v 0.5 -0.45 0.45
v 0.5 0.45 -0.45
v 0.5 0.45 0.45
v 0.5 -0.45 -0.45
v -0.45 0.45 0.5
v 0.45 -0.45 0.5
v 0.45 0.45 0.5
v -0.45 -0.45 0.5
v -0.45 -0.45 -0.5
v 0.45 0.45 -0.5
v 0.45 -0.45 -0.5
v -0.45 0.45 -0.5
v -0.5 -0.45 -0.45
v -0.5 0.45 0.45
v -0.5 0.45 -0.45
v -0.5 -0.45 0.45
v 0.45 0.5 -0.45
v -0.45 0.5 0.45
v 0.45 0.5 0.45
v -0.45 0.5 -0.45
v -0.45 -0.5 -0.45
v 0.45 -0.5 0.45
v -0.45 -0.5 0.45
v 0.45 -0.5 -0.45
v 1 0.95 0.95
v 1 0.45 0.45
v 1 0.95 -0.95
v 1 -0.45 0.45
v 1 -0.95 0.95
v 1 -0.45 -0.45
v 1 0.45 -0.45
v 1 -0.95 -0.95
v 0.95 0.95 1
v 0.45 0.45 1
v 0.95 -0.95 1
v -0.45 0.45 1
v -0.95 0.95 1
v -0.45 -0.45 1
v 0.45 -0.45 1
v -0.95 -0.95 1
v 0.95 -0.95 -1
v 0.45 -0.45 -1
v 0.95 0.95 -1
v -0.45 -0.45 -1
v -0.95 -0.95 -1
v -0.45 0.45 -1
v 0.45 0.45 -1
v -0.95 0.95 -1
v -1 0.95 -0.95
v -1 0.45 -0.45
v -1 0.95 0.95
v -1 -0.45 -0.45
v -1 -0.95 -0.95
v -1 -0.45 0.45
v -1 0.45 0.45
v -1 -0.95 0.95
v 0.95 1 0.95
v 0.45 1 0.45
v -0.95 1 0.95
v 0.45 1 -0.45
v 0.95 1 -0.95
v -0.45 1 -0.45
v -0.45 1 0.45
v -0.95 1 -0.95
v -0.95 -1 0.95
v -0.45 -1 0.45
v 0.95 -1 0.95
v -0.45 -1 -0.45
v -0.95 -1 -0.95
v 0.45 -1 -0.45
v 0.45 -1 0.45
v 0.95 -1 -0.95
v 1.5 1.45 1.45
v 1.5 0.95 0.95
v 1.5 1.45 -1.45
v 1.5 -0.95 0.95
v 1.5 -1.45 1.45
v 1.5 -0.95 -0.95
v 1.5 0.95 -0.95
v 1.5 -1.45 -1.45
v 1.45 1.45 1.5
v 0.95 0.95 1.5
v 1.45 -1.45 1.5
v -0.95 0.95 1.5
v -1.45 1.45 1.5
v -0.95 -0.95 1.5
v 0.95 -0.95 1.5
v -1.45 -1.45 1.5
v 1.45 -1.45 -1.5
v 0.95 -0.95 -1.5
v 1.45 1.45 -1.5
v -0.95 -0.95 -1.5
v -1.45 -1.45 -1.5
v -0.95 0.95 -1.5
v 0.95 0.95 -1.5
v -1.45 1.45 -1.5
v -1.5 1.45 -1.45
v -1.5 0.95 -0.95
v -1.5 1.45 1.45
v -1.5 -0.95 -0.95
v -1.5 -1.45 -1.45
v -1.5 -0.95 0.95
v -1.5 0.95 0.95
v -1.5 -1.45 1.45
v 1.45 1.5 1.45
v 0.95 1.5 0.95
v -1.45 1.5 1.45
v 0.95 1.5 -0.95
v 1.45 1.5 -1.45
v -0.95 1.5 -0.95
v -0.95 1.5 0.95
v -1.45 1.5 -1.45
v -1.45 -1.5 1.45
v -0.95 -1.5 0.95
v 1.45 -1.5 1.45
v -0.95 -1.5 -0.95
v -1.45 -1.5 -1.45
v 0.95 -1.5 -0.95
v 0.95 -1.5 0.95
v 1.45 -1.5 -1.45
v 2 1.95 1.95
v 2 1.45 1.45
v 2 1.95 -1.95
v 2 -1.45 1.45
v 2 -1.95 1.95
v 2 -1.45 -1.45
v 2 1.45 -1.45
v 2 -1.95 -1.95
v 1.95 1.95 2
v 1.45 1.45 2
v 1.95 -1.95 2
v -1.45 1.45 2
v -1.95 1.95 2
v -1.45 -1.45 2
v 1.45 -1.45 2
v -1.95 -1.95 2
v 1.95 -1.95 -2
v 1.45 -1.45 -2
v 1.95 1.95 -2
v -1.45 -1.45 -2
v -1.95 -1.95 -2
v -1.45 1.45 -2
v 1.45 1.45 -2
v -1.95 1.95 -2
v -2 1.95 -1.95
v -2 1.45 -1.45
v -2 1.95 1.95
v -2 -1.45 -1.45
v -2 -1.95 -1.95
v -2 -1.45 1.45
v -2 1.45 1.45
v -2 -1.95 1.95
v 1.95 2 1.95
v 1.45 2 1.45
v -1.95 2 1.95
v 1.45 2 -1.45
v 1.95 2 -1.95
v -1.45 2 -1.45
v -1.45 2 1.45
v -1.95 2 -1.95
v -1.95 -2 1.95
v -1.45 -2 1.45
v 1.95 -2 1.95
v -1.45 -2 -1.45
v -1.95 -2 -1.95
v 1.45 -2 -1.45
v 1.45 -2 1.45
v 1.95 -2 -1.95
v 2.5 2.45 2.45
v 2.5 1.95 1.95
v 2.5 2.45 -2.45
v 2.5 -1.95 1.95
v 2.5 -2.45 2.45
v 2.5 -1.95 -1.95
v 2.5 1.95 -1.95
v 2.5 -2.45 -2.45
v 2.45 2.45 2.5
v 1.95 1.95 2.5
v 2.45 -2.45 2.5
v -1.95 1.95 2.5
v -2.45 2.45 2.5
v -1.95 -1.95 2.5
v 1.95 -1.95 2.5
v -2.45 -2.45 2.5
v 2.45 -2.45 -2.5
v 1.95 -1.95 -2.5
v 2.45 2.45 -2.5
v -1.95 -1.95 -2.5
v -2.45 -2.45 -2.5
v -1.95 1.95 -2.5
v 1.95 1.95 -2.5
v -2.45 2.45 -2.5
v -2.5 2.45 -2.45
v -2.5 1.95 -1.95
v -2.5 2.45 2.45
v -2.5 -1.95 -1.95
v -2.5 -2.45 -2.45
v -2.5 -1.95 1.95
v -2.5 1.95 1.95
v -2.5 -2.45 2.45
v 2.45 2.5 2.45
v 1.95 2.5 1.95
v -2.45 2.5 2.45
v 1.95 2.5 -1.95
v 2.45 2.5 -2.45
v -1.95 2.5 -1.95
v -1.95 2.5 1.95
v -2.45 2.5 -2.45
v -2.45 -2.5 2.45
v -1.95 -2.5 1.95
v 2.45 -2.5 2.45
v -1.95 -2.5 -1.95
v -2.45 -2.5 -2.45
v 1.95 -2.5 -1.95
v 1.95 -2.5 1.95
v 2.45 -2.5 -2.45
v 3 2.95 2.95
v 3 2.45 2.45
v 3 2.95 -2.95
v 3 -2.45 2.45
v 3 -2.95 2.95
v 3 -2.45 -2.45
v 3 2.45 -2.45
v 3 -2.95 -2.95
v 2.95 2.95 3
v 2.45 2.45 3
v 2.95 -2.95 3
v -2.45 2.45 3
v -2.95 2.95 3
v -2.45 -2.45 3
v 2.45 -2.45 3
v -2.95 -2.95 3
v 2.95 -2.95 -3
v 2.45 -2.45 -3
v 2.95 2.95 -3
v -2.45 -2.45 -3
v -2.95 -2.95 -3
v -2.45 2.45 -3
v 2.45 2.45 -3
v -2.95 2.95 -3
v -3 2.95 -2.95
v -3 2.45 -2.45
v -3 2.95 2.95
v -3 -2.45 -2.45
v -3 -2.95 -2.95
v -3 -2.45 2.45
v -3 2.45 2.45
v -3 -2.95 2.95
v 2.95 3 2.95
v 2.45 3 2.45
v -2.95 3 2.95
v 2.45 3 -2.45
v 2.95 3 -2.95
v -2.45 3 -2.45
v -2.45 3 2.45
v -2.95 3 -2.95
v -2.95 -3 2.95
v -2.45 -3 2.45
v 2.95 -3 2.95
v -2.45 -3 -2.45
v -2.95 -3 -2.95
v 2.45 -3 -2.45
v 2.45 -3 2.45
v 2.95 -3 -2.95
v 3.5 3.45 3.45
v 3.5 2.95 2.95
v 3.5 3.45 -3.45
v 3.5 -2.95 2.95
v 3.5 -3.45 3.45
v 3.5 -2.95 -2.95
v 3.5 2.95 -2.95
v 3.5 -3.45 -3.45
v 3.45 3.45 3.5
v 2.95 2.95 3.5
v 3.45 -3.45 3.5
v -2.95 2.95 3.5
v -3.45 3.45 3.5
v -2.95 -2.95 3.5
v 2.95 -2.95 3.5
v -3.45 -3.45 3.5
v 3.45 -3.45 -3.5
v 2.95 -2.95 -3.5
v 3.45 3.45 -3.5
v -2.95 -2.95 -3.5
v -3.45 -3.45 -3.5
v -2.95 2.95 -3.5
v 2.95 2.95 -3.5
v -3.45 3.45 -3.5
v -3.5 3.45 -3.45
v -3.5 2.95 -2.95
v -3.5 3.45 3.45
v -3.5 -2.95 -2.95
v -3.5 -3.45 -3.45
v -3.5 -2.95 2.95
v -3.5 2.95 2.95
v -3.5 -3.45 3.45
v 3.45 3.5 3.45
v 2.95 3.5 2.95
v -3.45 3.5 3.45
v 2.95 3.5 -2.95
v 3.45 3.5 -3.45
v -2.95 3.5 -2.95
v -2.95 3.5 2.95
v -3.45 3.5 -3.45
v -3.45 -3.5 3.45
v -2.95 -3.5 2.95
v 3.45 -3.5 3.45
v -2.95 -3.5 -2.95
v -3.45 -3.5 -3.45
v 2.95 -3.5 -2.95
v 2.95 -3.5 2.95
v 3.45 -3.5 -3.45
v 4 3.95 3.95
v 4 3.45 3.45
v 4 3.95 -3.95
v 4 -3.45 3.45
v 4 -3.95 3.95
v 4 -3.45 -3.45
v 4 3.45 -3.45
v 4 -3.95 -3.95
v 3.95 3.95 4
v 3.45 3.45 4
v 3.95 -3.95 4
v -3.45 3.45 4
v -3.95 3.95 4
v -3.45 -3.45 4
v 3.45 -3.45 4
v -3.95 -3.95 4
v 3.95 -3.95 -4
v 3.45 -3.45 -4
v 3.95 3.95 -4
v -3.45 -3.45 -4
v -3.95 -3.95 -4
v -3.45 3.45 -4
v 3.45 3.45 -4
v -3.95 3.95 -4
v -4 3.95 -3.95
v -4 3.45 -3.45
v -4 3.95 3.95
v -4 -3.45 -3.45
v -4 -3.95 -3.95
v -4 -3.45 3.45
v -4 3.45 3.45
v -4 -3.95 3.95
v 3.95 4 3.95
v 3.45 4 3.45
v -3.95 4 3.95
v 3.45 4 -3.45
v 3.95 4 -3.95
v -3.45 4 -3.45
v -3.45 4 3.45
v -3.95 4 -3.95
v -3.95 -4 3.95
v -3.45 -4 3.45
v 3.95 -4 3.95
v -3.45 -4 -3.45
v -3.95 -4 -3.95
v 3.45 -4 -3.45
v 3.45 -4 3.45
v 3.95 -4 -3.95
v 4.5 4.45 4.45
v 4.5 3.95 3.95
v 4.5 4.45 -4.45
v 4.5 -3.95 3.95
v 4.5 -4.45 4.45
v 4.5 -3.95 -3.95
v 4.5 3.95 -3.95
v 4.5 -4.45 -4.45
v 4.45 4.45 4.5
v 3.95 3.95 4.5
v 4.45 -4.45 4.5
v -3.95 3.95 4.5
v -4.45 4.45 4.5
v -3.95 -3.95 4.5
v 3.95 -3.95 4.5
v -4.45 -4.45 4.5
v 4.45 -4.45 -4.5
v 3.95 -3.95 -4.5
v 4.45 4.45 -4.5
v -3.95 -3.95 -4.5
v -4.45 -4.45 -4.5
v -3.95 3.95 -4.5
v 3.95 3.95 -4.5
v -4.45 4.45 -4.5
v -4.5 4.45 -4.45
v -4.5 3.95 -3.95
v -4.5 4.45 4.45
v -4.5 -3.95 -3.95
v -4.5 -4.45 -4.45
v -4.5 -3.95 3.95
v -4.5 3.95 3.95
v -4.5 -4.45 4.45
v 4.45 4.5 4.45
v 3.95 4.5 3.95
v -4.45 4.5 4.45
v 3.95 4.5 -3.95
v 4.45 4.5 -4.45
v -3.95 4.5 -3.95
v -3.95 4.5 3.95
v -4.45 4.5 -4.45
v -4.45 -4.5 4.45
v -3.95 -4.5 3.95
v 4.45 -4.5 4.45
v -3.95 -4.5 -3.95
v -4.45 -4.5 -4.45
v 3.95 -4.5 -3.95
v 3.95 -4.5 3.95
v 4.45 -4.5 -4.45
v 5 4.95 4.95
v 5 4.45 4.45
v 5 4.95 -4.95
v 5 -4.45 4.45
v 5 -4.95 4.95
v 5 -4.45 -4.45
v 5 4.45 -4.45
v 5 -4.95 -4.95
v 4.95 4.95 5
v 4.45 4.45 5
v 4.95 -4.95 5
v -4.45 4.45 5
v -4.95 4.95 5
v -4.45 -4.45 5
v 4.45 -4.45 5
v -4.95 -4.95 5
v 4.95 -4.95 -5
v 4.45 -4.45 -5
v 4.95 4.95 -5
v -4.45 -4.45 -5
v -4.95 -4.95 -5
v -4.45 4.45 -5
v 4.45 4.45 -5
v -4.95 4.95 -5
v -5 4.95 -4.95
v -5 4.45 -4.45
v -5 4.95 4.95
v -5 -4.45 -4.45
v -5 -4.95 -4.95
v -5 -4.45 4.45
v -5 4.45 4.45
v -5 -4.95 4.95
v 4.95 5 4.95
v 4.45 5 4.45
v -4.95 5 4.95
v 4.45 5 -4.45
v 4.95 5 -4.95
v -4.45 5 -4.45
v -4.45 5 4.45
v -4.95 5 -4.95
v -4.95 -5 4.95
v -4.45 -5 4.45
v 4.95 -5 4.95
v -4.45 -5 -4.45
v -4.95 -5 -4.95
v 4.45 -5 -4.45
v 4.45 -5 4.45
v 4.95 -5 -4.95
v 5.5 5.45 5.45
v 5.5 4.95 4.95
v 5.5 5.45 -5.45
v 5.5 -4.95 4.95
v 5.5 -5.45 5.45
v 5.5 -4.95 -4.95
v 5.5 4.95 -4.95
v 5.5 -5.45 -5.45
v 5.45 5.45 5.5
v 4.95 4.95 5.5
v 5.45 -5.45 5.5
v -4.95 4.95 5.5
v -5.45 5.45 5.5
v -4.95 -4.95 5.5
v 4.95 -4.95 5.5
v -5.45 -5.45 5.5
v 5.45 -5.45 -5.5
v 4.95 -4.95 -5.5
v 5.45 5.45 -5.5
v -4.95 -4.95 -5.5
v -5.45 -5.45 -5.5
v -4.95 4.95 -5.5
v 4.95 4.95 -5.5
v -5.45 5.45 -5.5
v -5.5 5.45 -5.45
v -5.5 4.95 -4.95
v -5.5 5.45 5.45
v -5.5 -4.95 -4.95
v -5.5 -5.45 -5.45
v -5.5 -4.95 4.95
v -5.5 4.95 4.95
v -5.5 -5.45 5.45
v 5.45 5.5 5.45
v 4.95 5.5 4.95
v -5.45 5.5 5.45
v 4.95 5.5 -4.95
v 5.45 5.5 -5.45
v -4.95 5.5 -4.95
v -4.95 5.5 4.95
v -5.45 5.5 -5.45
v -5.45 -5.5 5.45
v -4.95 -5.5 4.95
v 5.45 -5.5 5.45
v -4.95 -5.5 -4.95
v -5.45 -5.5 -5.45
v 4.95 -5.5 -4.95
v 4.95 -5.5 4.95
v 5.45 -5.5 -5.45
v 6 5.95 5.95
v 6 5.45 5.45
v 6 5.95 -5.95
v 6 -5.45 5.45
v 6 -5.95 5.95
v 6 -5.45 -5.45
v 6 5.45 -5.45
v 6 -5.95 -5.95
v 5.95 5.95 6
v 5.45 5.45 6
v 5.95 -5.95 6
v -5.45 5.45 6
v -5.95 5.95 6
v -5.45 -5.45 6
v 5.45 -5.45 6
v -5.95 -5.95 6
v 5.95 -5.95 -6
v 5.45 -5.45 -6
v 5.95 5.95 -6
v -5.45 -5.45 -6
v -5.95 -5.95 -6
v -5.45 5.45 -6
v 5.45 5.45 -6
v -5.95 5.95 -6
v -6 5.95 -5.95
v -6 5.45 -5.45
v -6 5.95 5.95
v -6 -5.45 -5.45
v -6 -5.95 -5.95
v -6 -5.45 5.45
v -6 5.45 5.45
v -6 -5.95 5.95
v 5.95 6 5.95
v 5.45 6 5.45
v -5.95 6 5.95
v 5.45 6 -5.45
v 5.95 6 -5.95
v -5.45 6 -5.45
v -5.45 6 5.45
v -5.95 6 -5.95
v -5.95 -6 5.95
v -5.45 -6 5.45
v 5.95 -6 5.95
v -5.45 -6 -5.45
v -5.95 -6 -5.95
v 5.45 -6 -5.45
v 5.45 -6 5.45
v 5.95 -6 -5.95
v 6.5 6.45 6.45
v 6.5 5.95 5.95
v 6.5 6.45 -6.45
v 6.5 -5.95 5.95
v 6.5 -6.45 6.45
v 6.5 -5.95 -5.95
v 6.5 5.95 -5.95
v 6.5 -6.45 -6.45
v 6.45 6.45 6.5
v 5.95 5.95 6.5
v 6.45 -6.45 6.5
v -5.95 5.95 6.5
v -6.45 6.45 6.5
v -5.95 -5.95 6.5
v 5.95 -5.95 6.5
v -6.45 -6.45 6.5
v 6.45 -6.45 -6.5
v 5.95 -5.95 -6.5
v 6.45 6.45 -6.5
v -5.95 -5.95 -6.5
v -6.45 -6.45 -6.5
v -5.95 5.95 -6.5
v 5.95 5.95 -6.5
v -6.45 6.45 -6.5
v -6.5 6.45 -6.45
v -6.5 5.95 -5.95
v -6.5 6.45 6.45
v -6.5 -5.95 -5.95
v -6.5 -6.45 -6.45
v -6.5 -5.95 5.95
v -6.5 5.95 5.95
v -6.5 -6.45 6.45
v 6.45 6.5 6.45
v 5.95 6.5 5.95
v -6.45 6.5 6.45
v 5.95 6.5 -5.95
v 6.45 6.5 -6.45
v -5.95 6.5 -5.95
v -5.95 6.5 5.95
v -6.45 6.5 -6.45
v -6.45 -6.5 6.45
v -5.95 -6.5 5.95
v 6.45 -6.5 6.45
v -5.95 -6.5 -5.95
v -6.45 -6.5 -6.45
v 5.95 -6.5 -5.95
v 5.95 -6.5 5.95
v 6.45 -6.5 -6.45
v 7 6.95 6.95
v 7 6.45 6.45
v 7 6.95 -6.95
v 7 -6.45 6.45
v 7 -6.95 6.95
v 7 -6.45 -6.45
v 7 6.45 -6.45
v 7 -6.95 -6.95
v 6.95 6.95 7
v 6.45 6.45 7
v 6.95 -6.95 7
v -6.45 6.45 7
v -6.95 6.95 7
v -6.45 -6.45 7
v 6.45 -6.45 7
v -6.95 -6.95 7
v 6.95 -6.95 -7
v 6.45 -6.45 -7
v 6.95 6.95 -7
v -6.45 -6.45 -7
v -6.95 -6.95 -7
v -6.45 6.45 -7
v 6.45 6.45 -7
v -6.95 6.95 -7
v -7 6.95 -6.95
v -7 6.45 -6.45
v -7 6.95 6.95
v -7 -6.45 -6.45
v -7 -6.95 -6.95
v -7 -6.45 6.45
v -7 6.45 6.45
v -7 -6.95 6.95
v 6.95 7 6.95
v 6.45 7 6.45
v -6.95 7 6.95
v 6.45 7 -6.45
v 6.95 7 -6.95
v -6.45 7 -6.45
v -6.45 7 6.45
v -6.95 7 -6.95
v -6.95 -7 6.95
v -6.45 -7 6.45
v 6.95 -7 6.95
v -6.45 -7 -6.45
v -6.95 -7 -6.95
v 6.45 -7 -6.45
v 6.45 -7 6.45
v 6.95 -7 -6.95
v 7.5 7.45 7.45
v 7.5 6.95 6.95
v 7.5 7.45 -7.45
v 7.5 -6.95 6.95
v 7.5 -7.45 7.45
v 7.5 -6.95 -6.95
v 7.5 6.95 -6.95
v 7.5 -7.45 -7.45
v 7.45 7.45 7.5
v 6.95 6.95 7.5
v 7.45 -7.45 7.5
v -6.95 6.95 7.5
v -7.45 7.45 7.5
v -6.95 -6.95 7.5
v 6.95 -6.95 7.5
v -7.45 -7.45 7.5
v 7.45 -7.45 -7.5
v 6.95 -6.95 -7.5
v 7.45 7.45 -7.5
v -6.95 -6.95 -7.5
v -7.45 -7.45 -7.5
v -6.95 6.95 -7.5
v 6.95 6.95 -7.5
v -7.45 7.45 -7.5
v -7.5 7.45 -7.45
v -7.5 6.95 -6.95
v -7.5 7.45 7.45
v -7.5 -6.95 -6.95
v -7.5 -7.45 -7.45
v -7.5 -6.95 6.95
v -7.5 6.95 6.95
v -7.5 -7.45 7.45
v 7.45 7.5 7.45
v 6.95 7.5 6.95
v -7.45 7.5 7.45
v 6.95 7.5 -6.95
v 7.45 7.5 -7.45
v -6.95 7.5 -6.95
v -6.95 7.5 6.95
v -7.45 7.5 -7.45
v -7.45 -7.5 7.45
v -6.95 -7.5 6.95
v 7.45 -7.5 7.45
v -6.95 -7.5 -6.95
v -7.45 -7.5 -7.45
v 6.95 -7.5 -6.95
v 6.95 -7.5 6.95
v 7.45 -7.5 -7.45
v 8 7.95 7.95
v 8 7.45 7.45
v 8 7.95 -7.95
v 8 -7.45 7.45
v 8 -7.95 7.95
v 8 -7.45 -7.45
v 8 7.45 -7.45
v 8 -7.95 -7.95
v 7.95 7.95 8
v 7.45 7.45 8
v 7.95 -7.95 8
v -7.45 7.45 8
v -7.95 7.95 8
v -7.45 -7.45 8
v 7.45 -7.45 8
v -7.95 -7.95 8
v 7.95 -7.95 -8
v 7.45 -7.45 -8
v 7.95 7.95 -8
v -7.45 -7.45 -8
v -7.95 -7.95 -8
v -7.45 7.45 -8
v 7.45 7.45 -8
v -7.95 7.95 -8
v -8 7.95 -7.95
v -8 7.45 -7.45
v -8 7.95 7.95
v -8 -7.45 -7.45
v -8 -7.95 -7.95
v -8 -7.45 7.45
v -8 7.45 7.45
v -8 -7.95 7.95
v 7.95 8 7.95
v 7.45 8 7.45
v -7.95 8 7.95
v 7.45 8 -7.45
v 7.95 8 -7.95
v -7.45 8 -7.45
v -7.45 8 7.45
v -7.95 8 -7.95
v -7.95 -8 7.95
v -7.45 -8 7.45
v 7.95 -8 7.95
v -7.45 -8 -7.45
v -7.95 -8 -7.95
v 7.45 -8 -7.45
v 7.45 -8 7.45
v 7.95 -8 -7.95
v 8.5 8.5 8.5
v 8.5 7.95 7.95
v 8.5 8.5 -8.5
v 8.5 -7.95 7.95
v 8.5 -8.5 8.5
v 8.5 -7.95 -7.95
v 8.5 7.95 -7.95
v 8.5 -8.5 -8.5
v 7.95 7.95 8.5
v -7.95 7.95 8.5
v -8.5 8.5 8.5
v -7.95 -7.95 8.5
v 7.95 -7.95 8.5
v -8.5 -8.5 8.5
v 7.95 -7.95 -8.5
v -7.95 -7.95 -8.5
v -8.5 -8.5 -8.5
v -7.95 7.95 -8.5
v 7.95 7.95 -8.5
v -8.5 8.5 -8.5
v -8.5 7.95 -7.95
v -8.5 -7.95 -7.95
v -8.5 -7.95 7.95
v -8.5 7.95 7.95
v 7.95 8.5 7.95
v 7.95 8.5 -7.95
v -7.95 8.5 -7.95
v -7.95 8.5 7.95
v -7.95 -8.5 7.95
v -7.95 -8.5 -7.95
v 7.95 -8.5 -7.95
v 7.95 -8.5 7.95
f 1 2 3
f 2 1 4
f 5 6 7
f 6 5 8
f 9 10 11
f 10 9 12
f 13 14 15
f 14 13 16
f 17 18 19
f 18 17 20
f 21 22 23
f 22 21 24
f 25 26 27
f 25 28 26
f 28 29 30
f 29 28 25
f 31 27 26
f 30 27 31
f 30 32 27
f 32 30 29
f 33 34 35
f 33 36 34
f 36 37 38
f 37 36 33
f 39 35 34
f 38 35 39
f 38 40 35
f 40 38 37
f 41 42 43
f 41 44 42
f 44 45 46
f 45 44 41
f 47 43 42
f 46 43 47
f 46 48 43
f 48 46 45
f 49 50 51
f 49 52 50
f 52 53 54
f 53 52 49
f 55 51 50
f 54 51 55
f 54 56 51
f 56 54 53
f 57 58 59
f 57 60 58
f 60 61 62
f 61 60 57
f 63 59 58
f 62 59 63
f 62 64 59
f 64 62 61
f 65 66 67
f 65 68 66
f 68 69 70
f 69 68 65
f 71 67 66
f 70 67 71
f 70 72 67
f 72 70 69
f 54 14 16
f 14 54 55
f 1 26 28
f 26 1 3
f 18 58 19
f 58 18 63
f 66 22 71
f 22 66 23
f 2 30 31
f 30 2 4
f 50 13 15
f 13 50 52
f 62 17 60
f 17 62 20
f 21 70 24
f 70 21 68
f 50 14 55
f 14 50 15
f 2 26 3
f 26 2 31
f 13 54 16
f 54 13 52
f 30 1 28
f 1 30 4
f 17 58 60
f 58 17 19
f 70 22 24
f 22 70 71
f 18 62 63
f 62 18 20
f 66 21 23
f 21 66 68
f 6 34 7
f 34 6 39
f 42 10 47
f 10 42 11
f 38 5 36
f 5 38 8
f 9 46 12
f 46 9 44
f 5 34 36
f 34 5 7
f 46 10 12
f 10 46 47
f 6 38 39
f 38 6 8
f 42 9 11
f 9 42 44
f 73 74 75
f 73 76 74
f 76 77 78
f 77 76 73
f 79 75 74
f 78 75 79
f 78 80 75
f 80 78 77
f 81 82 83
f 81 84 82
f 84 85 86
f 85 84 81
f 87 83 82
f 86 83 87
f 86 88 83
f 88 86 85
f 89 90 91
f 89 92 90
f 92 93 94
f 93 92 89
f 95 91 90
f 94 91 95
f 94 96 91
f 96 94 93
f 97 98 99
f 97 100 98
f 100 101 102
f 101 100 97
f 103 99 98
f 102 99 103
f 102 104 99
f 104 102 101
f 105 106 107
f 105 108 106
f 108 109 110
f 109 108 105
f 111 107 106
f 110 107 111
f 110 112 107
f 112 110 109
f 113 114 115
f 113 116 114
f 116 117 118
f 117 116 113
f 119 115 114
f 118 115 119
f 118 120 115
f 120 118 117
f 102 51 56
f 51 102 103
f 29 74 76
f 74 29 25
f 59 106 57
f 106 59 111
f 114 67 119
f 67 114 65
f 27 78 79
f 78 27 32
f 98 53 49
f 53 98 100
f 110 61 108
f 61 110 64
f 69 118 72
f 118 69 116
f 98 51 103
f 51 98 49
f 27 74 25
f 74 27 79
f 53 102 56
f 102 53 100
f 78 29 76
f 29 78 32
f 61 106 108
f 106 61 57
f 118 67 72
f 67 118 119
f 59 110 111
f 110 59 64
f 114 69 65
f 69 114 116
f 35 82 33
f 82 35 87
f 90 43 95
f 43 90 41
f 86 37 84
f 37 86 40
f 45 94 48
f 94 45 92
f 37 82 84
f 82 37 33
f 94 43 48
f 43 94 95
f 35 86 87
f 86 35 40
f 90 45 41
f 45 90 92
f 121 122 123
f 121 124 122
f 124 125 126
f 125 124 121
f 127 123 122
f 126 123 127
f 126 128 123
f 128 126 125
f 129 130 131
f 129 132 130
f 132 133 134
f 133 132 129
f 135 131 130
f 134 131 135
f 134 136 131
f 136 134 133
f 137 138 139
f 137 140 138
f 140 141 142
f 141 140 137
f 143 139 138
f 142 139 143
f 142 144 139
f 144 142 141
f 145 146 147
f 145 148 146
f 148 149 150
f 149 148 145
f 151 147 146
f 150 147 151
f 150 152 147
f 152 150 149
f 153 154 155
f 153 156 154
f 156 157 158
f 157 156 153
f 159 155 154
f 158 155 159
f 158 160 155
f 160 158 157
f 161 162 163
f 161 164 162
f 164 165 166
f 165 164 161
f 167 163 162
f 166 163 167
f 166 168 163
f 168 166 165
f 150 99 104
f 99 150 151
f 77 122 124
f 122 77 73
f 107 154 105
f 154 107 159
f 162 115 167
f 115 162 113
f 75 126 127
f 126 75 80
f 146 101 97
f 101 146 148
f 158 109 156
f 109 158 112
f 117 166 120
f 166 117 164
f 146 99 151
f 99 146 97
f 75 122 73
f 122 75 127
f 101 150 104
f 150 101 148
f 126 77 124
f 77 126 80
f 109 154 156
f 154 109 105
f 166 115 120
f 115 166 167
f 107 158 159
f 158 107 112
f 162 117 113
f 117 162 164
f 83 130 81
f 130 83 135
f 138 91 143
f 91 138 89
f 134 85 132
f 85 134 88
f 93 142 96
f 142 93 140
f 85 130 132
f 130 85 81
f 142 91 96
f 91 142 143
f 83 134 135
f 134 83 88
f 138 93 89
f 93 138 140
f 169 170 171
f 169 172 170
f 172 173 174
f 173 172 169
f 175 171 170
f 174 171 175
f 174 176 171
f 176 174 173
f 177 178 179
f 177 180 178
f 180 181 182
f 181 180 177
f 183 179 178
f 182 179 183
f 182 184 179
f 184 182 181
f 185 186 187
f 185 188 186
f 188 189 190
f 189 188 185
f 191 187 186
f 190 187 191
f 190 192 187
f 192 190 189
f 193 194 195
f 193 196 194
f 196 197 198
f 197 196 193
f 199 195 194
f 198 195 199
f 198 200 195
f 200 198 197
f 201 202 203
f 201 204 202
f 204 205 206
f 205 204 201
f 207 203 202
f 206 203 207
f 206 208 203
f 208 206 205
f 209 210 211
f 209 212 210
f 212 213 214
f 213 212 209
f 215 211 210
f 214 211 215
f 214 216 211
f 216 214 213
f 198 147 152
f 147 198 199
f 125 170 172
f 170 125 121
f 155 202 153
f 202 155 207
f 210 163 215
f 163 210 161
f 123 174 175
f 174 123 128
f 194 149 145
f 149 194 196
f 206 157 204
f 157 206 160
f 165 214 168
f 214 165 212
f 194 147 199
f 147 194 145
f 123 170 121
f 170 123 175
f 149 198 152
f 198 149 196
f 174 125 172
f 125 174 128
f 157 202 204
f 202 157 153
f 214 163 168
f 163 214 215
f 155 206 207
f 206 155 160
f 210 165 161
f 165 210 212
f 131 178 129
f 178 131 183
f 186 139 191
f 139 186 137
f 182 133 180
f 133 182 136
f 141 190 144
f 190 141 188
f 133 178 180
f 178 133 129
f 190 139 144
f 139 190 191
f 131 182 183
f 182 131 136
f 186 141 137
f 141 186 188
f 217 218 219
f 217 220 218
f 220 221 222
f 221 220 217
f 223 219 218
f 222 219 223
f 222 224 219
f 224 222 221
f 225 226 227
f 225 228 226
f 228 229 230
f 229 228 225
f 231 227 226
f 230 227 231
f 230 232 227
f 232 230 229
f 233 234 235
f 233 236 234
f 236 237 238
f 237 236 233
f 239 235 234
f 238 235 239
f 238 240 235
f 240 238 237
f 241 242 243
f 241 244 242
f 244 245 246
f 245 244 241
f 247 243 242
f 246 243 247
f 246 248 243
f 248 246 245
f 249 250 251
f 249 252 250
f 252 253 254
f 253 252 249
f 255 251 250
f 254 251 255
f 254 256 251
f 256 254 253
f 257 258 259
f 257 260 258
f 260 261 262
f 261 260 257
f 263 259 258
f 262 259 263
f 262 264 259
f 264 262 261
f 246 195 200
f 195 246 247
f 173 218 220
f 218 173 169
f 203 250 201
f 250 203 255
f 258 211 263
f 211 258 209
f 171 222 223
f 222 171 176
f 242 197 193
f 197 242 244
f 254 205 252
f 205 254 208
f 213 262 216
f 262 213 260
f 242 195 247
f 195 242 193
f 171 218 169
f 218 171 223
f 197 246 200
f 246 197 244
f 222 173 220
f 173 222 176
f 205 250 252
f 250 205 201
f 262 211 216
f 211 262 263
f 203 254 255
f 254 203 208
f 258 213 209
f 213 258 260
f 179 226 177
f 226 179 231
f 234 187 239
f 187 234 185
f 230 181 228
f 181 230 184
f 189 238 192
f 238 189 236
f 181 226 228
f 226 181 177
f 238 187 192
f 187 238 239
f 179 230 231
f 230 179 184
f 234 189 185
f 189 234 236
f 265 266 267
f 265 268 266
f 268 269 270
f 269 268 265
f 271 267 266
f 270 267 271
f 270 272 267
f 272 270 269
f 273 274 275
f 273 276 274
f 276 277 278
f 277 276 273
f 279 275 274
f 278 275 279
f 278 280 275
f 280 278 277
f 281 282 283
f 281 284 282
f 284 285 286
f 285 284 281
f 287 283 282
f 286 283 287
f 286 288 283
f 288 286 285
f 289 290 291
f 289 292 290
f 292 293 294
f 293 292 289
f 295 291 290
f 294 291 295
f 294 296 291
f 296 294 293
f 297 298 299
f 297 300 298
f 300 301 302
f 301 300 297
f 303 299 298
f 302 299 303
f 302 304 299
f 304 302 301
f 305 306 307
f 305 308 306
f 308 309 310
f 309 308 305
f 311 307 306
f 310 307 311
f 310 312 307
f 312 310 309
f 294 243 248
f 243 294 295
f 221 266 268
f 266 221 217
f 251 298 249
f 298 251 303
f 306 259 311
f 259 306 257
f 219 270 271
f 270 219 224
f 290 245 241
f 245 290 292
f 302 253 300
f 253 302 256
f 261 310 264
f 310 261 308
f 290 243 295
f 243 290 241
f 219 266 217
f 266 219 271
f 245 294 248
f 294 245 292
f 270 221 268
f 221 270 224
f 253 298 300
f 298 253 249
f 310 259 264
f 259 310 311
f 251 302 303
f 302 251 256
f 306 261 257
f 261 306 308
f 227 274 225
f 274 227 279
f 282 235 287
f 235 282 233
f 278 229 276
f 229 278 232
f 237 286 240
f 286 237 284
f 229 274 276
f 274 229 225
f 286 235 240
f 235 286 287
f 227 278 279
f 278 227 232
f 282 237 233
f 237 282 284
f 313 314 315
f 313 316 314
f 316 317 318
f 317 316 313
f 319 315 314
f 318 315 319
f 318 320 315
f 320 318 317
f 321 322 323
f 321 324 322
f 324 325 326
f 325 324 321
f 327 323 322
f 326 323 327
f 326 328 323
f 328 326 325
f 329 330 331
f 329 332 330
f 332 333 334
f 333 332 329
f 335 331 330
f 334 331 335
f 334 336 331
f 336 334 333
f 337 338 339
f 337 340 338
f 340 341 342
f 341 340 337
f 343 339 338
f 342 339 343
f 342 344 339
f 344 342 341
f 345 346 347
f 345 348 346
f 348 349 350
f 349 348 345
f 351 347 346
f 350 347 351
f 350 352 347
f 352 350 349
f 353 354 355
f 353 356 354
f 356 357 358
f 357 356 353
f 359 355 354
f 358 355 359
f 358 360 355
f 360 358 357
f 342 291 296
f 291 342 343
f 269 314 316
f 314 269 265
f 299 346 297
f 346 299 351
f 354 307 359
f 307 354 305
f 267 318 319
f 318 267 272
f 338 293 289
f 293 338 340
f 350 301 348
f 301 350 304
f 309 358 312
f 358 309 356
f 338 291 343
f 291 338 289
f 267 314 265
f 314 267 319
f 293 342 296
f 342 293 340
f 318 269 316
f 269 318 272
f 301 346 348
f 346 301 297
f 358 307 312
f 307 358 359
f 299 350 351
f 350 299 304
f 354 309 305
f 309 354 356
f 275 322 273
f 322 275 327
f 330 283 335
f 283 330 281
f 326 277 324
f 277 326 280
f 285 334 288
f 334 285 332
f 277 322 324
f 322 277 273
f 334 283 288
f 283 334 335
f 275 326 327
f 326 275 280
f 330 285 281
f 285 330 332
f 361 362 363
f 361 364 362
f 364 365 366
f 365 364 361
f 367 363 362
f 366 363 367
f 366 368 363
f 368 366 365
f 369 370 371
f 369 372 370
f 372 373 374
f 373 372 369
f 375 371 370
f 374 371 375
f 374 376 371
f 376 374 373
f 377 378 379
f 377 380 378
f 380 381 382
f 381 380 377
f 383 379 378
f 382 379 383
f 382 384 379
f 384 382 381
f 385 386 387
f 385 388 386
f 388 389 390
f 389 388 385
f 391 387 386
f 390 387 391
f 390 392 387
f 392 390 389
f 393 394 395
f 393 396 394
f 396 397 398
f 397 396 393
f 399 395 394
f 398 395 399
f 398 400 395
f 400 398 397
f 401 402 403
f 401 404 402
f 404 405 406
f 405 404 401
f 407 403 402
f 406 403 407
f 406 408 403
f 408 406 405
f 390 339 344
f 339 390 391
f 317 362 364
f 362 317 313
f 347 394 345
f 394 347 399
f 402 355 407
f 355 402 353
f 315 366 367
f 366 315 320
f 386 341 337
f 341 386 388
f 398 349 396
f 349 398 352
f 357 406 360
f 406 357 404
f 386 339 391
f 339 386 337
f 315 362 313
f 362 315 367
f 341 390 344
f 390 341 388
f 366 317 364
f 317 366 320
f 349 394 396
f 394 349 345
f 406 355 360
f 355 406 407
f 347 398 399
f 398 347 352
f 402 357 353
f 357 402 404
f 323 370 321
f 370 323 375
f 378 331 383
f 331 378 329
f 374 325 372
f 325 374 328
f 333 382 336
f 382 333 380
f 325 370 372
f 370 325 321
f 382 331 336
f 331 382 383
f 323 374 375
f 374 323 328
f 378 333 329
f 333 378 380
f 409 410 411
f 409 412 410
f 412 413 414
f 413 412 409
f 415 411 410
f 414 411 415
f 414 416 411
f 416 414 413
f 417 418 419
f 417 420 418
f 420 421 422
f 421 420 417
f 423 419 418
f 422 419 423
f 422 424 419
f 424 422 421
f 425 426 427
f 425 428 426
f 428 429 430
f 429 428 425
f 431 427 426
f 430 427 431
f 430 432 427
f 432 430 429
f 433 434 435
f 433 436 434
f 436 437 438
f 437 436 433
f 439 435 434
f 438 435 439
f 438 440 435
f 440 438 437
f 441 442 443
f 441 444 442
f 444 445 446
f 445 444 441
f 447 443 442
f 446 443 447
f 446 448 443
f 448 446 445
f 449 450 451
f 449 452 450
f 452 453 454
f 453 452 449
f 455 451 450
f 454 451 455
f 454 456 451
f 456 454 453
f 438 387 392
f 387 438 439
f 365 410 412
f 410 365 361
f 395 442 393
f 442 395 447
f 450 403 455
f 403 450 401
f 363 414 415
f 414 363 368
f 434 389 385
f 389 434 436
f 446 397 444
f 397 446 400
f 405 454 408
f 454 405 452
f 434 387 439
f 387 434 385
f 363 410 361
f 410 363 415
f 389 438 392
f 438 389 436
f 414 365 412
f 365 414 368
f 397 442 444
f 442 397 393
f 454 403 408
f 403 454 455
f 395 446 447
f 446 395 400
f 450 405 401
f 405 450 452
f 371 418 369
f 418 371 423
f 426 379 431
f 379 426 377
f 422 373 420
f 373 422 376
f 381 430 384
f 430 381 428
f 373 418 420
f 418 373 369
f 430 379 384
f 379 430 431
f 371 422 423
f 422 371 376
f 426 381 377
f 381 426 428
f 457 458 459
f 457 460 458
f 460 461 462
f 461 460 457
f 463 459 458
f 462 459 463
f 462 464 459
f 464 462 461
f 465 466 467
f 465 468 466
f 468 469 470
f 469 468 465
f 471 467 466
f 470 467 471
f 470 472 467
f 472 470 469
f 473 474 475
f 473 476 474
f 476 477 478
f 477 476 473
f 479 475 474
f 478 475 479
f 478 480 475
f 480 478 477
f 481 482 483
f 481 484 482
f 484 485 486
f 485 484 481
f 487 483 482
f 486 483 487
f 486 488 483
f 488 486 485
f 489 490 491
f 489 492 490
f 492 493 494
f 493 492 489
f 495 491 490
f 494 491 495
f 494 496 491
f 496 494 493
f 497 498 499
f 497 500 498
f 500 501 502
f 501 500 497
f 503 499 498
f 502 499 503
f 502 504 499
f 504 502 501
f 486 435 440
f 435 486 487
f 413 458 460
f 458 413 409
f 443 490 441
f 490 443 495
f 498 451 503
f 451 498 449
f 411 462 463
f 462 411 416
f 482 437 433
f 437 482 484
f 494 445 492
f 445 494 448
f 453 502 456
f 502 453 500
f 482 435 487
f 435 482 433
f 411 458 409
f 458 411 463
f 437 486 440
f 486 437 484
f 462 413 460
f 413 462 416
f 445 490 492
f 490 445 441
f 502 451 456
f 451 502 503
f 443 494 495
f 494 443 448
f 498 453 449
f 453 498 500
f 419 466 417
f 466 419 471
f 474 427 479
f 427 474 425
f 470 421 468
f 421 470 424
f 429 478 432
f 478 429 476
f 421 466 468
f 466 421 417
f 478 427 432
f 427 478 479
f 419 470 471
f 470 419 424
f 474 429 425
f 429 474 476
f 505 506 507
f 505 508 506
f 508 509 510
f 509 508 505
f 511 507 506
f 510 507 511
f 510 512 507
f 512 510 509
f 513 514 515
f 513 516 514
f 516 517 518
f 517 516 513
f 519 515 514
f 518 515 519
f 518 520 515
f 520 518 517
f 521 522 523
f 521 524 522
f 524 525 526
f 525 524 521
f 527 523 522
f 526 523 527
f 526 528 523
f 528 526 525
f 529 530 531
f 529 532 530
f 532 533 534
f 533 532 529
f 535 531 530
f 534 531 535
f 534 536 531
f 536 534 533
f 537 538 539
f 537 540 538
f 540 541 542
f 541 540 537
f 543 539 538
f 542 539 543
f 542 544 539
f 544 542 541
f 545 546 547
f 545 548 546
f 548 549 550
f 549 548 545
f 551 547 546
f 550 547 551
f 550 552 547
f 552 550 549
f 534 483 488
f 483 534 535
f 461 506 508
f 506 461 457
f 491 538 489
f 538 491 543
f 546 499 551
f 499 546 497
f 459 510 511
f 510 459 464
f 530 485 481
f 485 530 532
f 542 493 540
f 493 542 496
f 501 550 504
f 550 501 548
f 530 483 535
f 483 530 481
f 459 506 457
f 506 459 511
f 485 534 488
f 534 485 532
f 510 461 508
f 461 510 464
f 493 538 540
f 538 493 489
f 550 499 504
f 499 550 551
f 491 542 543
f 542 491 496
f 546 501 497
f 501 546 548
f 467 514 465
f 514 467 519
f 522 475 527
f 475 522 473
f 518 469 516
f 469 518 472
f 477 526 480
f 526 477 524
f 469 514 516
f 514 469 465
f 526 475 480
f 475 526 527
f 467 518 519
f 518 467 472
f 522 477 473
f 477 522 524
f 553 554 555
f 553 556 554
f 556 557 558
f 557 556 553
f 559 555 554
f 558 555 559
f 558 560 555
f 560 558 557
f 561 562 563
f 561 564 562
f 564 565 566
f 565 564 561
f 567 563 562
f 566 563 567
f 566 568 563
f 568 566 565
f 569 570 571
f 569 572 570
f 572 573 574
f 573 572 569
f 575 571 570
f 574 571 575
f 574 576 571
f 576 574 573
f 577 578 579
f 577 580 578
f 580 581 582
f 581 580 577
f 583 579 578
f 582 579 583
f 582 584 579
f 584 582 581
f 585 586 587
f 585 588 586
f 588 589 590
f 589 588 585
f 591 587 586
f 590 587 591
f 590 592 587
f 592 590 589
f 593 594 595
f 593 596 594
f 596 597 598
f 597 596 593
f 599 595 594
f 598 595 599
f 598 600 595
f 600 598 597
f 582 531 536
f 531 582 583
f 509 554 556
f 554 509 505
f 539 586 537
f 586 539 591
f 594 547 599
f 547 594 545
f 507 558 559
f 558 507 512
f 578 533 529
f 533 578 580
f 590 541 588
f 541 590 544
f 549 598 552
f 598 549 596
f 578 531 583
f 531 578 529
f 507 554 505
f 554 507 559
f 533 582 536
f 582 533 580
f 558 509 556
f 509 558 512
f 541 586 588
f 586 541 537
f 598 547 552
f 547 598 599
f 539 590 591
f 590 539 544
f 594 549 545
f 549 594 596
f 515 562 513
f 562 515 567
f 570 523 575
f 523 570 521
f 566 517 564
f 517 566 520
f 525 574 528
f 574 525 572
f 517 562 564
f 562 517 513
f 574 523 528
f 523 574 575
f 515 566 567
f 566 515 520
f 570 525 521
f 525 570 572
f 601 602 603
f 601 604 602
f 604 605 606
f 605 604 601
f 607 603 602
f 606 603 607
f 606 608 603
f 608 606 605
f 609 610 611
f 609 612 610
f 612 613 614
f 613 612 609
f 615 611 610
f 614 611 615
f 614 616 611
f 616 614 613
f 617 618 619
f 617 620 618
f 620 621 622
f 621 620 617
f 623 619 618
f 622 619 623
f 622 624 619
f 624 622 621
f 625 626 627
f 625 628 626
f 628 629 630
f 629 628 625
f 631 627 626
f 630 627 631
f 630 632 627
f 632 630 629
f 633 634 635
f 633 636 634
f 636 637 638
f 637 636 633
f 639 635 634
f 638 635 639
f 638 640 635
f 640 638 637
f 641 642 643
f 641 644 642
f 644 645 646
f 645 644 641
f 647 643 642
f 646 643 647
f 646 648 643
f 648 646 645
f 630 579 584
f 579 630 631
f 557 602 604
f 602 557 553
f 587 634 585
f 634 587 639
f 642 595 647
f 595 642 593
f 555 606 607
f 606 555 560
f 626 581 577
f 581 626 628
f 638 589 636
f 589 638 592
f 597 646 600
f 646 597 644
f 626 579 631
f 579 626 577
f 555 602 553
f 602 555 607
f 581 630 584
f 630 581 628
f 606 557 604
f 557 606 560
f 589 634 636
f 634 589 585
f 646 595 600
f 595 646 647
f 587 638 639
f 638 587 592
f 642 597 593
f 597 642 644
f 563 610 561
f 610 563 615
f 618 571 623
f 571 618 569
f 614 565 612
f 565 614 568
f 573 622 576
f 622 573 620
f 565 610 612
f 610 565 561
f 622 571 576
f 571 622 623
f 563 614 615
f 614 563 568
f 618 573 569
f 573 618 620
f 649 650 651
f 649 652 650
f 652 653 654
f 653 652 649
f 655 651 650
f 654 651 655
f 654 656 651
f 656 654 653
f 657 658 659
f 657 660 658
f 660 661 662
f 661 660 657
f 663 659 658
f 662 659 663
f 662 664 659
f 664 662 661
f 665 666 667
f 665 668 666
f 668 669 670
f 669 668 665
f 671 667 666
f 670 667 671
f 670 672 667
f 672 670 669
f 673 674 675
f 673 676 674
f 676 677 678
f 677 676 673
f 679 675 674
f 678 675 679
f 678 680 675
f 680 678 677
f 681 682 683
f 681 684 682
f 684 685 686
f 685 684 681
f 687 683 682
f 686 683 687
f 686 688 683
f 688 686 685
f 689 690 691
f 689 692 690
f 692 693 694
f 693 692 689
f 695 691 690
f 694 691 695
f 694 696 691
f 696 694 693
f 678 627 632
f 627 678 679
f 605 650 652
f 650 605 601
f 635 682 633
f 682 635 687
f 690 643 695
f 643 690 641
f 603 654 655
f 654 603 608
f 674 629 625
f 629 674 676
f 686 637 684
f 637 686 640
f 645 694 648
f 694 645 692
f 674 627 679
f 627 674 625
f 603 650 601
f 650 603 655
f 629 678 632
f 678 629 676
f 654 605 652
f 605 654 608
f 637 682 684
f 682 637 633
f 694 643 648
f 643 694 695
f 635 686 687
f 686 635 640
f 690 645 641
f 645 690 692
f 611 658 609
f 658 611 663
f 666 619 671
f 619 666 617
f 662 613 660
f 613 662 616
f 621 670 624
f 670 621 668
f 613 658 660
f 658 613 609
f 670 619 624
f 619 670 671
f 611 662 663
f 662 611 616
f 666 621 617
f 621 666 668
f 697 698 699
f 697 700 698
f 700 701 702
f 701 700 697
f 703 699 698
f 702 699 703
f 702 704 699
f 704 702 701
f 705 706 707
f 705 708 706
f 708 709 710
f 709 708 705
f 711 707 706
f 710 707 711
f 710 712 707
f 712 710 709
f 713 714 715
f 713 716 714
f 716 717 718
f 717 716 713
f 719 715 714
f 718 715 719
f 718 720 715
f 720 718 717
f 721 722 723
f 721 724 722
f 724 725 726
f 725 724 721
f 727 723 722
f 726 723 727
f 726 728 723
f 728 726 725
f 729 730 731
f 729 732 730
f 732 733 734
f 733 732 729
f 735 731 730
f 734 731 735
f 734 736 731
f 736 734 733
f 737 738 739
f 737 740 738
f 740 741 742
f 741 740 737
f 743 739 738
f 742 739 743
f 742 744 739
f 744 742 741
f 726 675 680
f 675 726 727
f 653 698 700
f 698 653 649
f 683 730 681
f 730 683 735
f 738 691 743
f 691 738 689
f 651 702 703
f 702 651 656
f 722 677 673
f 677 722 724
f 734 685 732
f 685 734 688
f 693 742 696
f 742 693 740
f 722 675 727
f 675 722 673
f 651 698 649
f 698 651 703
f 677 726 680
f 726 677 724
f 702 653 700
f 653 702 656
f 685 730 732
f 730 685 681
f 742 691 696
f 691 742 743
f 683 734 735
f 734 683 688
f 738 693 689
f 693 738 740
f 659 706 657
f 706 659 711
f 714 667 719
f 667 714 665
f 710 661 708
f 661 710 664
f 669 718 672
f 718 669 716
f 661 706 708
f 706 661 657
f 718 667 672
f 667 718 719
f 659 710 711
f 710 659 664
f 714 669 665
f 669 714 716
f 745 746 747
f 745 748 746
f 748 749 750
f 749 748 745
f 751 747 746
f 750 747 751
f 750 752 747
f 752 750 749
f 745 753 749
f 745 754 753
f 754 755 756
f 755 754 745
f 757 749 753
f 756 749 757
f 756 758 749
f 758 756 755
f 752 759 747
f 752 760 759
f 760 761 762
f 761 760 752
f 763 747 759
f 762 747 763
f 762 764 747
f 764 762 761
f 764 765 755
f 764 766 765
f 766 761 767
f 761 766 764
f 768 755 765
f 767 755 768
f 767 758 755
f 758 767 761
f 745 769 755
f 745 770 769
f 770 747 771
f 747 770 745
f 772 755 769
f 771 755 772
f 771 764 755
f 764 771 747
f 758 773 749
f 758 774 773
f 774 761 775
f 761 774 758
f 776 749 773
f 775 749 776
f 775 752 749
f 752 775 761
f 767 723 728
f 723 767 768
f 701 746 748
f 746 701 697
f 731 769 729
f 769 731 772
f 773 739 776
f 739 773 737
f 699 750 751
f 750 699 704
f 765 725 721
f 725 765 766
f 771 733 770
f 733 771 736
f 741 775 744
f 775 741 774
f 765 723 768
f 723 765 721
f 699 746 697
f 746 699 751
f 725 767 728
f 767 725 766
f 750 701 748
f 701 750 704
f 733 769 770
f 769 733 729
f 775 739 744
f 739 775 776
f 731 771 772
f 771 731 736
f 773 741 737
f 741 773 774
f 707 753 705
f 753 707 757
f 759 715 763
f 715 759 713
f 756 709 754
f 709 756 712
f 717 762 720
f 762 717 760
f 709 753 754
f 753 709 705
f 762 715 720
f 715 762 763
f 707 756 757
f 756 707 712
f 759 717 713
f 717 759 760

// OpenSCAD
t = 10;
wth = 1.1;//width of bars
for(h = [0 : 17])
{ 
    
 difference(){
     
    cube(size = [h,h,h], center = true);
     
         cube(size = [h,h-wth,h-wth], center = true);
         cube(size = [h-wth,h,h-wth], center = true);
         cube(size = [h-wth,h-wth,h], center = true);
     t=t-1;
     
  } 
}
